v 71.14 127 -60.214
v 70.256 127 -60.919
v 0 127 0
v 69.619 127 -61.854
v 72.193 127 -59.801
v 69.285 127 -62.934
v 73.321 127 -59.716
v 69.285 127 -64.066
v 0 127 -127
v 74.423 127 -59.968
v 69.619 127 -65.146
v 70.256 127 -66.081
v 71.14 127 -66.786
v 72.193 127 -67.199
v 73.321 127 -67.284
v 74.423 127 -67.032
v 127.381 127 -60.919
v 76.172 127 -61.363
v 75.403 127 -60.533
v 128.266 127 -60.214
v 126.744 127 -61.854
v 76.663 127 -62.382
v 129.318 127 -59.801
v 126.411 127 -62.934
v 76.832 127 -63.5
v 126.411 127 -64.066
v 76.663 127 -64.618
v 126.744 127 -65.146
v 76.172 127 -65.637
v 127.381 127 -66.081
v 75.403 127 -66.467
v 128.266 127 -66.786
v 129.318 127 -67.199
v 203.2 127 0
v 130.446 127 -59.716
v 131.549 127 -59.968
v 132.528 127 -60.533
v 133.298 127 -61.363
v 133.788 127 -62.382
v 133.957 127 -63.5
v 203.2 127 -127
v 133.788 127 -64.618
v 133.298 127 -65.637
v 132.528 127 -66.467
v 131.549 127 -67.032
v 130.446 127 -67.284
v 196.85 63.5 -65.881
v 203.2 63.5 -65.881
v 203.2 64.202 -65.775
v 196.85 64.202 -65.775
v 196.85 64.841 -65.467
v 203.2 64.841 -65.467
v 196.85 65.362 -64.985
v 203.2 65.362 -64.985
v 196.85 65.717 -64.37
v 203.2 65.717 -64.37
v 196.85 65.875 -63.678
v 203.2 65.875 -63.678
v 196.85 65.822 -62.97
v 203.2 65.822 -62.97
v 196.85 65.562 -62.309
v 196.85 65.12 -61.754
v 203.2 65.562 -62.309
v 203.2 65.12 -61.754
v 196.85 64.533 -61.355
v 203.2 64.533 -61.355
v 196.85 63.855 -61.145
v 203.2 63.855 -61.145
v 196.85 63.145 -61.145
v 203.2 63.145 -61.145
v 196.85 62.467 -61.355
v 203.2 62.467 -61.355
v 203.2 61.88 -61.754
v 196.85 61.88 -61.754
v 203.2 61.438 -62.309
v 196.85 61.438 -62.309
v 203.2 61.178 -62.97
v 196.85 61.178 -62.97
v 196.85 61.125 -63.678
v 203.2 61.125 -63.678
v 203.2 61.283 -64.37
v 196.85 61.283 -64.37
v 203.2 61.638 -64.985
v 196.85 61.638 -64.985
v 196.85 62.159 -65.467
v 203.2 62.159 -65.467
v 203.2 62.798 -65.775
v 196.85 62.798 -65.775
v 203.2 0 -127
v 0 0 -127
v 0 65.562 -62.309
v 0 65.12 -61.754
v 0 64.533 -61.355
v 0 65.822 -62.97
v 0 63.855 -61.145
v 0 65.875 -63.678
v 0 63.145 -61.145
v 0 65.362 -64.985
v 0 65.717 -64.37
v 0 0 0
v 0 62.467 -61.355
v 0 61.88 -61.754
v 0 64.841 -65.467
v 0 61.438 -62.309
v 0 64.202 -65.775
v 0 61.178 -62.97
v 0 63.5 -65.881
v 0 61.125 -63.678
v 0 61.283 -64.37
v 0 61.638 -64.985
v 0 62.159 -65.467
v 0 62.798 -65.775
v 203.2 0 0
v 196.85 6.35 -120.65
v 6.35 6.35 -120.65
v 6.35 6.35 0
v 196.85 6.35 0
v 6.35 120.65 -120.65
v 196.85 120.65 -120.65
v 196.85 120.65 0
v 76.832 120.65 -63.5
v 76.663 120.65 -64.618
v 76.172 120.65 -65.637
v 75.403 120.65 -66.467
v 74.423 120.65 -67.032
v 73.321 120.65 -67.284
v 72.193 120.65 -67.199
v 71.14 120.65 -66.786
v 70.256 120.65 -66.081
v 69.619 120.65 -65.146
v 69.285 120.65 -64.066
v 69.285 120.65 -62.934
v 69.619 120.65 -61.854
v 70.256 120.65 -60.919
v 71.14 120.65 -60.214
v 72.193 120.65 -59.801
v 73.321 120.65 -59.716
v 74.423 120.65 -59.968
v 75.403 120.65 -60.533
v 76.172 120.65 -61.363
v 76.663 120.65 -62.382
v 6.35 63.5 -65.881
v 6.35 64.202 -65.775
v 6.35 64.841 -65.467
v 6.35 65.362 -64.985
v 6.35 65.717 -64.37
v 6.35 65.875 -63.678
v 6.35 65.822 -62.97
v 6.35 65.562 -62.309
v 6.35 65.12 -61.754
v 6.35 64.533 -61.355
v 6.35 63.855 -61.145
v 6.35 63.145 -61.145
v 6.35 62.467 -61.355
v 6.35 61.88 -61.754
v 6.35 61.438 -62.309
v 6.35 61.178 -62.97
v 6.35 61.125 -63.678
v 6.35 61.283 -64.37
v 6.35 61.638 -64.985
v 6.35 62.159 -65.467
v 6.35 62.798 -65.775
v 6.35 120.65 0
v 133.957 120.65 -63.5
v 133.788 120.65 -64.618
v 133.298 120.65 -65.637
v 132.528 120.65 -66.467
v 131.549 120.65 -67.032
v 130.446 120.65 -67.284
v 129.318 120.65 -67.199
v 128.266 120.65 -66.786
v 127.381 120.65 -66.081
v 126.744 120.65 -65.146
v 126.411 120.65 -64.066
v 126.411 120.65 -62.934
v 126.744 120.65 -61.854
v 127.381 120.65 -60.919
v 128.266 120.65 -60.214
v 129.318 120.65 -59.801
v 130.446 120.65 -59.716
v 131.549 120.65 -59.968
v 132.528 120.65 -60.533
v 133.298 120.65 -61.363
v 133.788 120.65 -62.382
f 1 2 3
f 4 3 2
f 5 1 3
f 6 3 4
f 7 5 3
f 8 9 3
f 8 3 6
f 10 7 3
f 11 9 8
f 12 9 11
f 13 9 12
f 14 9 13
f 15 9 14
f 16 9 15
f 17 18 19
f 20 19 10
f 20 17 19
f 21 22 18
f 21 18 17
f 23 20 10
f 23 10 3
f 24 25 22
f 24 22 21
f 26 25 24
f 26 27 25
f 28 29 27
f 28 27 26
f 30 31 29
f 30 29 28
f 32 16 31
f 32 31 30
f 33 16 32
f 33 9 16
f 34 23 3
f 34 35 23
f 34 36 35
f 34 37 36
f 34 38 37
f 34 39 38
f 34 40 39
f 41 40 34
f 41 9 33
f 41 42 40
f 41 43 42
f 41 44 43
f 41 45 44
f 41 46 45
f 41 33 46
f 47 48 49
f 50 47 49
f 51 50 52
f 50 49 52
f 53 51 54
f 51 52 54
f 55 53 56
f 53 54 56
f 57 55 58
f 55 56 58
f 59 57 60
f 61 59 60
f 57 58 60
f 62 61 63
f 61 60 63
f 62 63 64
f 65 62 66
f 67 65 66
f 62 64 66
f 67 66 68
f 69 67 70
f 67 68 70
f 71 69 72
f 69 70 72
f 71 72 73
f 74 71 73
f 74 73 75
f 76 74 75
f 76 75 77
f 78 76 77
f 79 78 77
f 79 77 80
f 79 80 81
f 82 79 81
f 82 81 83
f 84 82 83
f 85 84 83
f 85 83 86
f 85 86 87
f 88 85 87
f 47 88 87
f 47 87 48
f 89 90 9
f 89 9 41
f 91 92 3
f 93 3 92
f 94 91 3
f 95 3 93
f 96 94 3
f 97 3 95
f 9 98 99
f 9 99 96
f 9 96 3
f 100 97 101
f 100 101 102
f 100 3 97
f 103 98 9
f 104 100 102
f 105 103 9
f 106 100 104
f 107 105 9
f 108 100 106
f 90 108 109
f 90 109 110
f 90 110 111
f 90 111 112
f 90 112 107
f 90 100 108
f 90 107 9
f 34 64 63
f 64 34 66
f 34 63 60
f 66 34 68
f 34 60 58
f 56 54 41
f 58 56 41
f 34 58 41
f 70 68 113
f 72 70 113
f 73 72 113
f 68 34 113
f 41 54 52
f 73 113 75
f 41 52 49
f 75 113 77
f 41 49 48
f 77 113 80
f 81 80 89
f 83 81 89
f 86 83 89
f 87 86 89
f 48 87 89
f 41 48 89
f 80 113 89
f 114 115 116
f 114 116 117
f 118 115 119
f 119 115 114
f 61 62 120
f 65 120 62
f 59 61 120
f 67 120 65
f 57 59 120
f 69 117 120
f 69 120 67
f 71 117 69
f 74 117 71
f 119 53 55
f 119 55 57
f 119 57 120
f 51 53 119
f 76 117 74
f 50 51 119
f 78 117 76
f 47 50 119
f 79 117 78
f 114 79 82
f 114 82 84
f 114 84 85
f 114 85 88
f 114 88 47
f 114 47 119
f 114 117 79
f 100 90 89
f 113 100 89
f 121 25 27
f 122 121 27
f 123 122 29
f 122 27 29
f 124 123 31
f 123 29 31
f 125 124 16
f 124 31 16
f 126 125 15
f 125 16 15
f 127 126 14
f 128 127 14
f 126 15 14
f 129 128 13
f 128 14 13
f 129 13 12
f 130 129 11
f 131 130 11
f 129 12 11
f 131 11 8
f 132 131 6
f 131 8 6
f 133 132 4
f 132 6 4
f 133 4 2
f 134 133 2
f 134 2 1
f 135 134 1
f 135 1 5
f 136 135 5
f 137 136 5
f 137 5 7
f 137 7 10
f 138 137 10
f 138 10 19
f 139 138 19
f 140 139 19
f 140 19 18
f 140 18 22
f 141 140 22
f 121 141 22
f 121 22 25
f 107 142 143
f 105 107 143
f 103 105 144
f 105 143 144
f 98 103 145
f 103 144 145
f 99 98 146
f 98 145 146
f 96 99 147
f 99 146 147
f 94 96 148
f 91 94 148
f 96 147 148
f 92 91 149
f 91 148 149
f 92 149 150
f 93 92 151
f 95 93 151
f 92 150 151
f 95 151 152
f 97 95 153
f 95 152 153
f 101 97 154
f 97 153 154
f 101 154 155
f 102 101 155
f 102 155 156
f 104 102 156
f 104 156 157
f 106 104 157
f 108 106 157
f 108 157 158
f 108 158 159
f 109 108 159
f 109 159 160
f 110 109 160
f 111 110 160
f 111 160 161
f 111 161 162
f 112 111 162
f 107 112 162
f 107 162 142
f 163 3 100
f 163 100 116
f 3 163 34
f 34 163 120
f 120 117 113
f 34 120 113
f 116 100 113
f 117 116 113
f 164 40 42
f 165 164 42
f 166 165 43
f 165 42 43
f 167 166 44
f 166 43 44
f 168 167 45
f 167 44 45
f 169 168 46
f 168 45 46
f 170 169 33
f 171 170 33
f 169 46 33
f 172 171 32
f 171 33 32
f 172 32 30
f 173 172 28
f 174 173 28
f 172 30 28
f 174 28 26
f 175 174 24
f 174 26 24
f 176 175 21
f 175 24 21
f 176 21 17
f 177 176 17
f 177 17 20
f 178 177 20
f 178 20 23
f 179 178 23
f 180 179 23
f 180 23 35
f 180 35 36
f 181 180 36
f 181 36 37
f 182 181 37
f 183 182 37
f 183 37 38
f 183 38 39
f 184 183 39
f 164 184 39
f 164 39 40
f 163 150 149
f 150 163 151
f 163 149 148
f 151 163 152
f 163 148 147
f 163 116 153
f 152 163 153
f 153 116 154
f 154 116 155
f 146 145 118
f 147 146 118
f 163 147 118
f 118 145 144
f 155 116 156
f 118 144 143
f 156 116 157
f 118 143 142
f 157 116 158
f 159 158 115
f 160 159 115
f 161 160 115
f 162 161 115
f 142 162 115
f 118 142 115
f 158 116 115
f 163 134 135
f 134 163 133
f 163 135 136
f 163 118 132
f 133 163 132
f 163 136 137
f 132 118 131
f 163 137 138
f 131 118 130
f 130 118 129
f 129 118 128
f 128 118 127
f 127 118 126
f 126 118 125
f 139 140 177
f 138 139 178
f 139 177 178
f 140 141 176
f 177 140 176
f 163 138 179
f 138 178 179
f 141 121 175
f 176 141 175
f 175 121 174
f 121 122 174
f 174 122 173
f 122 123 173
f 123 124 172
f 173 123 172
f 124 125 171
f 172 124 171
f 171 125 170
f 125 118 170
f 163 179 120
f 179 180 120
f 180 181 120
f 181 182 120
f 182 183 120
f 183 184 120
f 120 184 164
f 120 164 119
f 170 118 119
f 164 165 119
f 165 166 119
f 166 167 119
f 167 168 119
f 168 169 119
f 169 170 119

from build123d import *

# Parameters (mm, degrees)
SKETCH1_W           = 203.2
SKETCH1_H           = 127
BOSS_EXTRUDE1_DEPTH = 127
SHELL1_T            = -6.35
SKETCH2_R           = 2.38125
CUT_EXTRUDE1_DEPTH  = 204.2
SKETCH4_R           = 3.794312019
CUT_EXTRUDE3_DEPTH  = 23.368


with BuildPart() as part:
    # Sketch1 → Boss-Extrude1 (new body)
    with BuildSketch(Plane(origin=(0, 0, 0), x_dir=(1, 0, 0), z_dir=(0, 1, 0))):
        with Locations((101.6, 63.5)):
            Rectangle(SKETCH1_W, SKETCH1_H)
    extrude(amount=BOSS_EXTRUDE1_DEPTH)

    # Shell1
    shell1_openings = [part.faces().sort_by_distance(p)[0] for p in [
        (101.6, 63.5, 0),
    ]]
    offset(amount=SHELL1_T, openings=shell1_openings, kind=Kind.INTERSECTION)

    # Sketch2 → Cut-Extrude1 (cut, through all)
    with BuildSketch(Plane(origin=(203.2, 0, 0), x_dir=(0, 0, -1), z_dir=(1, 0, 0))):
        with Locations((63.5, 63.5)):
            Circle(SKETCH2_R)
    extrude(amount=-CUT_EXTRUDE1_DEPTH, mode=Mode.SUBTRACT)

    # Sketch4 → Cut-Extrude3 (cut)
    with BuildSketch(Plane(origin=(0, 127, 0), x_dir=(1, 0, 0), z_dir=(0, 1, 0))):
        with Locations((73.037262301, 63.5)):
            Circle(SKETCH4_R)
        with Locations((130.162737699, 63.5)):
            Circle(SKETCH4_R)
    extrude(amount=-CUT_EXTRUDE3_DEPTH, mode=Mode.SUBTRACT)


solid = part.part
